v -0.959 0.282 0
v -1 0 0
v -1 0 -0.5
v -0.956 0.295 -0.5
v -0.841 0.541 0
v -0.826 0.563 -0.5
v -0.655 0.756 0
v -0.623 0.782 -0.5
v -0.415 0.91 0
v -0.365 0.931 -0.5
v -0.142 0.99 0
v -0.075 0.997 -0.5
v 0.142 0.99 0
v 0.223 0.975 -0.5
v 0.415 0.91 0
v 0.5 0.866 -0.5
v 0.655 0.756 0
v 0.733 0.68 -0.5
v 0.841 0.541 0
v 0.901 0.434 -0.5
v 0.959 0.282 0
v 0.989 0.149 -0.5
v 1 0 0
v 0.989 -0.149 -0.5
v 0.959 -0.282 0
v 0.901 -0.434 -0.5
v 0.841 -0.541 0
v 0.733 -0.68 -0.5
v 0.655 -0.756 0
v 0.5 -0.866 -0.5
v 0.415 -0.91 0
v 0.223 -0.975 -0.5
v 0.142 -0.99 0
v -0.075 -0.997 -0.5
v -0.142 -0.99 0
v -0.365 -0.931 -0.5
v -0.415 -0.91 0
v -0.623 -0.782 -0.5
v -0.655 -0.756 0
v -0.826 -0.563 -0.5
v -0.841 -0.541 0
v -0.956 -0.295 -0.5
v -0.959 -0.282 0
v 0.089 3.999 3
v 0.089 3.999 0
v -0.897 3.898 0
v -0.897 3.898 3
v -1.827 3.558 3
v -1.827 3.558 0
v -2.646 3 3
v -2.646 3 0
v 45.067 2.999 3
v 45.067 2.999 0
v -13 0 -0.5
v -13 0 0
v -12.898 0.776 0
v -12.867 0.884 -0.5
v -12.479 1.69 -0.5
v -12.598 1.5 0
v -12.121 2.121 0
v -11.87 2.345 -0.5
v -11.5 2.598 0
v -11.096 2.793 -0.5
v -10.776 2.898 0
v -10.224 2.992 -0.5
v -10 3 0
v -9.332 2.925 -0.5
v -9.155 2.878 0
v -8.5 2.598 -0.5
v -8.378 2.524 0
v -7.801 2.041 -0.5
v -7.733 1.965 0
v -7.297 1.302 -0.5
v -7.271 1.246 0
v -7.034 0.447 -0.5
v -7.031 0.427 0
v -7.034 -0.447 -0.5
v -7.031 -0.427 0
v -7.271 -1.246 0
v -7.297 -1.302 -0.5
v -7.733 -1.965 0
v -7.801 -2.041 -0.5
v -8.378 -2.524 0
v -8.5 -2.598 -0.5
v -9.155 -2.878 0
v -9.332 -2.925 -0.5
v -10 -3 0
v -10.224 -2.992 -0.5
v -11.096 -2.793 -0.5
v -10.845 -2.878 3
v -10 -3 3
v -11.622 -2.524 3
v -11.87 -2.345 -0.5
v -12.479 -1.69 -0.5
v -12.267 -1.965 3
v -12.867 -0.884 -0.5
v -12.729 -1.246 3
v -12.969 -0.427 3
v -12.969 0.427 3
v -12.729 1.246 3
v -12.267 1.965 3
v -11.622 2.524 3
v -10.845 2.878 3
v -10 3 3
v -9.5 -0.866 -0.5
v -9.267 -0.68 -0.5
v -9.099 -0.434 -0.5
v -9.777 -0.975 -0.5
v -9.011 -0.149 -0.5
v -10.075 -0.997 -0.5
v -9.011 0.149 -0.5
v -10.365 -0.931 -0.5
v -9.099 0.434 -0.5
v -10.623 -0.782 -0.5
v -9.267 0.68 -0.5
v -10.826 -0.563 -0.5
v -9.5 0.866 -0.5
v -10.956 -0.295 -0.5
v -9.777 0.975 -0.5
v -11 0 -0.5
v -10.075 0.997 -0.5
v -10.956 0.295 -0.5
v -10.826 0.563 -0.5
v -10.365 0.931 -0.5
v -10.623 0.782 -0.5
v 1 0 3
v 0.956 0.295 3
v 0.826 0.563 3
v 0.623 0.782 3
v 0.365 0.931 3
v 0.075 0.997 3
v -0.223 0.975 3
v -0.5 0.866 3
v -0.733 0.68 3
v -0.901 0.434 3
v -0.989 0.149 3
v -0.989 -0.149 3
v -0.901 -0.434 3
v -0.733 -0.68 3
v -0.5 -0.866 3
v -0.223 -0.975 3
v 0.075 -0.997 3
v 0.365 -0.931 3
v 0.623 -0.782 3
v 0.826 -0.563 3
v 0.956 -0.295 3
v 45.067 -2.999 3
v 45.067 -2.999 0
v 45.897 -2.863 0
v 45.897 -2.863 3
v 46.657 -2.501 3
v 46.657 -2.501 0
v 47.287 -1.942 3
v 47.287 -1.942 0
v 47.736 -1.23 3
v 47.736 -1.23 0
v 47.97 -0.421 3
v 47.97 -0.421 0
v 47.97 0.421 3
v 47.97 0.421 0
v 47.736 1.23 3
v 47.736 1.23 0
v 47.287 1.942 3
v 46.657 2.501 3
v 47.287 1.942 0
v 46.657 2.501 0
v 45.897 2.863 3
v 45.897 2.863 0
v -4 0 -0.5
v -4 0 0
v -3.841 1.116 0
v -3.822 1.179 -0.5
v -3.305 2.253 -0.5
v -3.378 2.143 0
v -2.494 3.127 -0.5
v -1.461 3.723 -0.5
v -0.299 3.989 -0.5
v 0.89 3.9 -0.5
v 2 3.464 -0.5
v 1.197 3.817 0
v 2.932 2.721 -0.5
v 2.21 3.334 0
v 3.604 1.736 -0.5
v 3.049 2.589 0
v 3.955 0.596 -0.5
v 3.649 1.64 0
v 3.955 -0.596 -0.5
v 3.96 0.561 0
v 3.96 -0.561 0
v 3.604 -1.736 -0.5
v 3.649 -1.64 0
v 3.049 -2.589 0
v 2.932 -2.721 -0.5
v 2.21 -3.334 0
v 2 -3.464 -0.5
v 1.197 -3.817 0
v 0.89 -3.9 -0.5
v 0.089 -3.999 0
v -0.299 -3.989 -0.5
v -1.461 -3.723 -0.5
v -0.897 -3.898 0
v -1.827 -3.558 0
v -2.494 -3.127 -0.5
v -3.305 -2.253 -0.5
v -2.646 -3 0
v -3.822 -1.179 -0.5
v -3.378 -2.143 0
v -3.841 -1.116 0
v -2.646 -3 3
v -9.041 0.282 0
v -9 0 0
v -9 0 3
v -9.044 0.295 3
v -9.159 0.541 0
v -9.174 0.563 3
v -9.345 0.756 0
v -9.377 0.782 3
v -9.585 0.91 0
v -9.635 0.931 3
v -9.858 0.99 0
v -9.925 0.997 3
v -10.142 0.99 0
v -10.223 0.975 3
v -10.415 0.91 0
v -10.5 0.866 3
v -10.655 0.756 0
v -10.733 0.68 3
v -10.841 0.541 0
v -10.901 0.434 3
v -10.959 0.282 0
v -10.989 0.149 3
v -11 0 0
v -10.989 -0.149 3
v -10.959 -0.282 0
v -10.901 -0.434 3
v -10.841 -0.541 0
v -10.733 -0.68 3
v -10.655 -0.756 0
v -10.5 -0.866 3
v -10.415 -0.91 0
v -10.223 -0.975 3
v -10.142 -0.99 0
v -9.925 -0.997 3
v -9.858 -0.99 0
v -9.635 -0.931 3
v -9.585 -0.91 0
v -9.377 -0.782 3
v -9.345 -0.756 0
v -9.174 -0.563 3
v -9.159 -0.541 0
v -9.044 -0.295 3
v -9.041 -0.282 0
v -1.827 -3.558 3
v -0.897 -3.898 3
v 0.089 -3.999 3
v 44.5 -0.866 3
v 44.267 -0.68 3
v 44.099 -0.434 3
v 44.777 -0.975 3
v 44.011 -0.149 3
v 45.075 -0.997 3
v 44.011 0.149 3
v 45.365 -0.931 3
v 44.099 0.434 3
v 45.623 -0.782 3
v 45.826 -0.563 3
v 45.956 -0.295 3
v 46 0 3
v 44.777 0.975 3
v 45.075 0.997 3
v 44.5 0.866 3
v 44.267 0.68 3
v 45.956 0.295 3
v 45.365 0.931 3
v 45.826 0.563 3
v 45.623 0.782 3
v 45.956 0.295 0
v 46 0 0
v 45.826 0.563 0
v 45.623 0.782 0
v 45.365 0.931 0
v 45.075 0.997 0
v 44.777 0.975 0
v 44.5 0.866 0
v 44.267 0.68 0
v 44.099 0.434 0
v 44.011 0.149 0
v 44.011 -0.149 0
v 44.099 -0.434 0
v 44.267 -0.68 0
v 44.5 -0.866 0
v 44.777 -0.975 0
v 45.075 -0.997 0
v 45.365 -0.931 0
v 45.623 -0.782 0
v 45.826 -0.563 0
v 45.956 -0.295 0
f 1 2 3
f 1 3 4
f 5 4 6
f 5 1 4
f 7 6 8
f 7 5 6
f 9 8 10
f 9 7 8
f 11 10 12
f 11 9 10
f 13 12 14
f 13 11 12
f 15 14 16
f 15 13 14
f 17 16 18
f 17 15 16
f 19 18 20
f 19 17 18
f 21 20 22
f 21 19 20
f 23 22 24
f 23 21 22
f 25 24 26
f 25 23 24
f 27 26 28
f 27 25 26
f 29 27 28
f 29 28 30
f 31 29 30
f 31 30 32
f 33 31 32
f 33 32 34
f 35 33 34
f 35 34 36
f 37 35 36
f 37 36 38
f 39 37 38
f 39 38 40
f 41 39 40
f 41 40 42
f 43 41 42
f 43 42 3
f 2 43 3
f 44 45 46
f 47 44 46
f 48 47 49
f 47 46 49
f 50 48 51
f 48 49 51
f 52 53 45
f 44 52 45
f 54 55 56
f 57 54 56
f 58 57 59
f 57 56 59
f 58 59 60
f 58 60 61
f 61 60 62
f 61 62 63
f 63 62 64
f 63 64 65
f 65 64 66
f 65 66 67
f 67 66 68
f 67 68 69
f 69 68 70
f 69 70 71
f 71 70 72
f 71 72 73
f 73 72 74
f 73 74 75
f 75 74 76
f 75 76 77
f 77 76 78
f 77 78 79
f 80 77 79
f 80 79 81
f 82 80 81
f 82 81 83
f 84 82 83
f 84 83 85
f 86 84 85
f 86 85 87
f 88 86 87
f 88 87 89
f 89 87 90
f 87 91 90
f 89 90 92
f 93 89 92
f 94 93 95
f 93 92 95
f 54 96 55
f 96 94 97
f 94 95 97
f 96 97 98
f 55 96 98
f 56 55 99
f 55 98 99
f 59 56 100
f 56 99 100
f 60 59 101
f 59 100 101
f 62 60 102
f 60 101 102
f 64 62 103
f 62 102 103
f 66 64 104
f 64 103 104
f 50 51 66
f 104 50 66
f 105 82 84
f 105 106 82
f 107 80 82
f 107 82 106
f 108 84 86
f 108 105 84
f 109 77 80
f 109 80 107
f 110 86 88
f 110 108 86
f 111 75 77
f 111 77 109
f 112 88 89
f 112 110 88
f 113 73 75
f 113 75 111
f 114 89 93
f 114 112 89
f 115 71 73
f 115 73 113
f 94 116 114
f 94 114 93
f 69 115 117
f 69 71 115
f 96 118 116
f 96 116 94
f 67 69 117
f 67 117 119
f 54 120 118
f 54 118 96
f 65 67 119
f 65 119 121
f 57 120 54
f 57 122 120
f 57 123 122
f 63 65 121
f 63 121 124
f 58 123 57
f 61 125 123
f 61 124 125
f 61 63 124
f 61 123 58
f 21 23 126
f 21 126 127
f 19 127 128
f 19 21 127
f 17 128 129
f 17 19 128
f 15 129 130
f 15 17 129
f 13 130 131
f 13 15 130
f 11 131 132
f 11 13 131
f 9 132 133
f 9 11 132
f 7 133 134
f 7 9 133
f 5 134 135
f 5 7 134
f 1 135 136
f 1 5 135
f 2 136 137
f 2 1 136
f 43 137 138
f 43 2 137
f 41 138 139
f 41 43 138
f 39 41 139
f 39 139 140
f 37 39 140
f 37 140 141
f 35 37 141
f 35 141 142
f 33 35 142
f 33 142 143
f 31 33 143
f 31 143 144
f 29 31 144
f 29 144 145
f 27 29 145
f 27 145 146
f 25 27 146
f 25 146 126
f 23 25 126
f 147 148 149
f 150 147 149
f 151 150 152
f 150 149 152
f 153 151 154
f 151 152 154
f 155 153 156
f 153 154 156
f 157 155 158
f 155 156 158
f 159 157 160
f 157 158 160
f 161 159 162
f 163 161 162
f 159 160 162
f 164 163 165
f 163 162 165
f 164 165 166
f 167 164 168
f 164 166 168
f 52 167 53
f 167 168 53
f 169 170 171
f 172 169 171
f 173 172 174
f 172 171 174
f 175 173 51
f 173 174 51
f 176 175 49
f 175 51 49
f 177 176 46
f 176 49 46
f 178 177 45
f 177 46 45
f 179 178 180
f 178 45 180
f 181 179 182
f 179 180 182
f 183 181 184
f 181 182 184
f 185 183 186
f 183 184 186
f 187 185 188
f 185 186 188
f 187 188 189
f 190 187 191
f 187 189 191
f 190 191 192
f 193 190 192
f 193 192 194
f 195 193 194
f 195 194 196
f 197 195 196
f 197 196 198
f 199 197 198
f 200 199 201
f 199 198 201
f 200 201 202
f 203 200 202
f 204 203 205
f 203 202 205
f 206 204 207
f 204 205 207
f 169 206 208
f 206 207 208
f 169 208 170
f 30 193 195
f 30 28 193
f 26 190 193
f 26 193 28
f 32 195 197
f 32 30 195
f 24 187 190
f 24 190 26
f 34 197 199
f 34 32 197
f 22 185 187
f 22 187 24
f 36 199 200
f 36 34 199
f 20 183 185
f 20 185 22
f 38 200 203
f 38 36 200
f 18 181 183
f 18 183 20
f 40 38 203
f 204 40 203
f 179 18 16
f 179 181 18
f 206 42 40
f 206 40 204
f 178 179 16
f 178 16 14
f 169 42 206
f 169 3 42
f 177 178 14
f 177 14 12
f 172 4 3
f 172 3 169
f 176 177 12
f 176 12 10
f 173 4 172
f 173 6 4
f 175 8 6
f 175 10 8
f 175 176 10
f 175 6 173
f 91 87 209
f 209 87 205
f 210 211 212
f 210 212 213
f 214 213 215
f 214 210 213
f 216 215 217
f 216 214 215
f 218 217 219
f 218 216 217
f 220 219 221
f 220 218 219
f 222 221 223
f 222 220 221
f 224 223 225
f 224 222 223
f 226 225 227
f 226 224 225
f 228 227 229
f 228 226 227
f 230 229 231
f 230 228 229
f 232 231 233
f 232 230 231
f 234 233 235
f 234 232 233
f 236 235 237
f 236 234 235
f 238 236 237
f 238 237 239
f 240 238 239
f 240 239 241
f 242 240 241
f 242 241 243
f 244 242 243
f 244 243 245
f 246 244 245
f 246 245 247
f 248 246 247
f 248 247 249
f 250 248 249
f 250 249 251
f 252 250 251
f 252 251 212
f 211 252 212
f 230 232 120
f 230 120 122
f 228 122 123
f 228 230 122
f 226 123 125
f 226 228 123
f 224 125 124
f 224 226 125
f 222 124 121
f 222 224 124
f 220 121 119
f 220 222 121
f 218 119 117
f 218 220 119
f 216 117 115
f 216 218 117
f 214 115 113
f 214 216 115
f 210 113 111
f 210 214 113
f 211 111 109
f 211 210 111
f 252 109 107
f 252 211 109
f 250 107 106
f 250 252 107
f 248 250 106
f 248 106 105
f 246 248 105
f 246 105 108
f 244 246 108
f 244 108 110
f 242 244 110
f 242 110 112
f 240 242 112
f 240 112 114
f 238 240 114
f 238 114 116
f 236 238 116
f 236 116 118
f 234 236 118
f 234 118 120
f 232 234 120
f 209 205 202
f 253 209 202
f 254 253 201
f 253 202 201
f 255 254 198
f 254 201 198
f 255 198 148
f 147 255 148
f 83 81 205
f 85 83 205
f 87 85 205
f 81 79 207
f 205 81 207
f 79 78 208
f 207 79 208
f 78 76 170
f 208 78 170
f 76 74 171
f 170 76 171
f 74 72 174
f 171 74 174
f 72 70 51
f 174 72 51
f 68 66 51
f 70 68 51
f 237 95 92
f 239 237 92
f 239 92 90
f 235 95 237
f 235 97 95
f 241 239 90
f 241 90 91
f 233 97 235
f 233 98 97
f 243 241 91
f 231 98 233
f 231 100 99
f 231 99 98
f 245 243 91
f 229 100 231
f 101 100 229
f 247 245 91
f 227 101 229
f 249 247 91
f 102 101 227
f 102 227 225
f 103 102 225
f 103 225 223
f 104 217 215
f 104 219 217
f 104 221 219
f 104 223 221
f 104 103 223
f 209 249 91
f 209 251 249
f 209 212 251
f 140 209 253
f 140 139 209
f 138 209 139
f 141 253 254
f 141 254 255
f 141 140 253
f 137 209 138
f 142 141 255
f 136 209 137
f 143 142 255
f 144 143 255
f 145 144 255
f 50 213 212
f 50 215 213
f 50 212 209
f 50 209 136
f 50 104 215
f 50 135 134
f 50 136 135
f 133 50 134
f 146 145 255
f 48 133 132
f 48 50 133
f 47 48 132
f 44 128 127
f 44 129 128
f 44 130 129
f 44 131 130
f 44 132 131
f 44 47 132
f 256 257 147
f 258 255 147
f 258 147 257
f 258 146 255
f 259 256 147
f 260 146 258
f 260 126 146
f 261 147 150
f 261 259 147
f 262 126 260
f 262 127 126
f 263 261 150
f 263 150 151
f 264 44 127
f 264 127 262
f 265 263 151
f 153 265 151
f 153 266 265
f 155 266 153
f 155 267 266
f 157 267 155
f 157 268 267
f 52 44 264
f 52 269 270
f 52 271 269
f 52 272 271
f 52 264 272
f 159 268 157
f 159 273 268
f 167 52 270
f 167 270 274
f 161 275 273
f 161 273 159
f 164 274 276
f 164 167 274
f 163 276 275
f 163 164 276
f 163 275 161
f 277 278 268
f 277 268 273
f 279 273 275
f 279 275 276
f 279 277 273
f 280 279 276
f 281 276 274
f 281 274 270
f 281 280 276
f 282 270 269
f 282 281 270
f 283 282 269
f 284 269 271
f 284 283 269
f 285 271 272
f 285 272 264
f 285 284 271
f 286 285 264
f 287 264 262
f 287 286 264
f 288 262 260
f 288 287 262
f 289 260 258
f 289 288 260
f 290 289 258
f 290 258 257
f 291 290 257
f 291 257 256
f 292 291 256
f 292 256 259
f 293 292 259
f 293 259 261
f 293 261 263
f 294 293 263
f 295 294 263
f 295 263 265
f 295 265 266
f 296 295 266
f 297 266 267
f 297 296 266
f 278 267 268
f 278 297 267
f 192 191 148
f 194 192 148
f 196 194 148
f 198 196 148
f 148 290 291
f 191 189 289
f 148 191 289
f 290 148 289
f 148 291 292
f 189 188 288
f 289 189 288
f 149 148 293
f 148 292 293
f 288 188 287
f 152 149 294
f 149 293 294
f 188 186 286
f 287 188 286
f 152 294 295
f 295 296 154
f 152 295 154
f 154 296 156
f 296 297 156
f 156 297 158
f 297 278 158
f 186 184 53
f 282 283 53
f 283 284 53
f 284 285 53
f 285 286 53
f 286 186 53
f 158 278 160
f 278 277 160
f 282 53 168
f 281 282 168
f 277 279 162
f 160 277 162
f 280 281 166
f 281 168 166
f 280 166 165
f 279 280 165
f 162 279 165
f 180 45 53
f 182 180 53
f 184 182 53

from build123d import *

# Parameters (mm, degrees)
SKETCH1_R           = 1
BOSS_EXTRUDE1_DEPTH = 3
SKETCH2_R           = 3
SKETCH2_R_2         = 1
SKETCH2_R_3         = 4
BOSS_EXTRUDE2_DEPTH = 0.5


with BuildPart() as part:
    # Sketch1 → Boss-Extrude1 (new body)
    with BuildSketch(Plane.XY):
        with BuildLine():
            ThreePointArc((-2.645751311, -3), (-1.372549714, -3.757140839), (0.088888889, -3.999012224))
            Line((0.088888889, -3.999012224), (45.066666667, -2.999259168))
            ThreePointArc((45.066666667, -2.999259168), (48, 0), (45.066666667, 2.999259168))
            Line((45.066666667, 2.999259168), (0.088888889, 3.999012224))
            ThreePointArc((0.088888889, 3.999012224), (-1.372549714, 3.757140839), (-2.645751311, 3))
            Line((-2.645751311, 3), (-10, 3))
            ThreePointArc((-10, 3), (-13, 0), (-10, -3))
            Line((-10, -3), (-2.645751311, -3))
        make_face()
        Circle(SKETCH1_R, mode=Mode.SUBTRACT)
        with Locations((-10, 0)):
            Circle(SKETCH1_R, mode=Mode.SUBTRACT)
        with Locations((45, 0)):
            Circle(SKETCH1_R, mode=Mode.SUBTRACT)
    extrude(amount=BOSS_EXTRUDE1_DEPTH)

    # Sketch2 → Boss-Extrude2 (add)
    with BuildSketch(Plane(origin=(0, 0, 0), x_dir=(-1, 0, 0), z_dir=(0, 0, -1))):
        with Locations((10, 0)):
            Circle(SKETCH2_R)
        with Locations((10, 0)):
            Circle(SKETCH2_R_2, mode=Mode.SUBTRACT)
        Circle(SKETCH2_R_3)
        Circle(SKETCH2_R_2, mode=Mode.SUBTRACT)
    extrude(amount=BOSS_EXTRUDE2_DEPTH)


solid = part.part
